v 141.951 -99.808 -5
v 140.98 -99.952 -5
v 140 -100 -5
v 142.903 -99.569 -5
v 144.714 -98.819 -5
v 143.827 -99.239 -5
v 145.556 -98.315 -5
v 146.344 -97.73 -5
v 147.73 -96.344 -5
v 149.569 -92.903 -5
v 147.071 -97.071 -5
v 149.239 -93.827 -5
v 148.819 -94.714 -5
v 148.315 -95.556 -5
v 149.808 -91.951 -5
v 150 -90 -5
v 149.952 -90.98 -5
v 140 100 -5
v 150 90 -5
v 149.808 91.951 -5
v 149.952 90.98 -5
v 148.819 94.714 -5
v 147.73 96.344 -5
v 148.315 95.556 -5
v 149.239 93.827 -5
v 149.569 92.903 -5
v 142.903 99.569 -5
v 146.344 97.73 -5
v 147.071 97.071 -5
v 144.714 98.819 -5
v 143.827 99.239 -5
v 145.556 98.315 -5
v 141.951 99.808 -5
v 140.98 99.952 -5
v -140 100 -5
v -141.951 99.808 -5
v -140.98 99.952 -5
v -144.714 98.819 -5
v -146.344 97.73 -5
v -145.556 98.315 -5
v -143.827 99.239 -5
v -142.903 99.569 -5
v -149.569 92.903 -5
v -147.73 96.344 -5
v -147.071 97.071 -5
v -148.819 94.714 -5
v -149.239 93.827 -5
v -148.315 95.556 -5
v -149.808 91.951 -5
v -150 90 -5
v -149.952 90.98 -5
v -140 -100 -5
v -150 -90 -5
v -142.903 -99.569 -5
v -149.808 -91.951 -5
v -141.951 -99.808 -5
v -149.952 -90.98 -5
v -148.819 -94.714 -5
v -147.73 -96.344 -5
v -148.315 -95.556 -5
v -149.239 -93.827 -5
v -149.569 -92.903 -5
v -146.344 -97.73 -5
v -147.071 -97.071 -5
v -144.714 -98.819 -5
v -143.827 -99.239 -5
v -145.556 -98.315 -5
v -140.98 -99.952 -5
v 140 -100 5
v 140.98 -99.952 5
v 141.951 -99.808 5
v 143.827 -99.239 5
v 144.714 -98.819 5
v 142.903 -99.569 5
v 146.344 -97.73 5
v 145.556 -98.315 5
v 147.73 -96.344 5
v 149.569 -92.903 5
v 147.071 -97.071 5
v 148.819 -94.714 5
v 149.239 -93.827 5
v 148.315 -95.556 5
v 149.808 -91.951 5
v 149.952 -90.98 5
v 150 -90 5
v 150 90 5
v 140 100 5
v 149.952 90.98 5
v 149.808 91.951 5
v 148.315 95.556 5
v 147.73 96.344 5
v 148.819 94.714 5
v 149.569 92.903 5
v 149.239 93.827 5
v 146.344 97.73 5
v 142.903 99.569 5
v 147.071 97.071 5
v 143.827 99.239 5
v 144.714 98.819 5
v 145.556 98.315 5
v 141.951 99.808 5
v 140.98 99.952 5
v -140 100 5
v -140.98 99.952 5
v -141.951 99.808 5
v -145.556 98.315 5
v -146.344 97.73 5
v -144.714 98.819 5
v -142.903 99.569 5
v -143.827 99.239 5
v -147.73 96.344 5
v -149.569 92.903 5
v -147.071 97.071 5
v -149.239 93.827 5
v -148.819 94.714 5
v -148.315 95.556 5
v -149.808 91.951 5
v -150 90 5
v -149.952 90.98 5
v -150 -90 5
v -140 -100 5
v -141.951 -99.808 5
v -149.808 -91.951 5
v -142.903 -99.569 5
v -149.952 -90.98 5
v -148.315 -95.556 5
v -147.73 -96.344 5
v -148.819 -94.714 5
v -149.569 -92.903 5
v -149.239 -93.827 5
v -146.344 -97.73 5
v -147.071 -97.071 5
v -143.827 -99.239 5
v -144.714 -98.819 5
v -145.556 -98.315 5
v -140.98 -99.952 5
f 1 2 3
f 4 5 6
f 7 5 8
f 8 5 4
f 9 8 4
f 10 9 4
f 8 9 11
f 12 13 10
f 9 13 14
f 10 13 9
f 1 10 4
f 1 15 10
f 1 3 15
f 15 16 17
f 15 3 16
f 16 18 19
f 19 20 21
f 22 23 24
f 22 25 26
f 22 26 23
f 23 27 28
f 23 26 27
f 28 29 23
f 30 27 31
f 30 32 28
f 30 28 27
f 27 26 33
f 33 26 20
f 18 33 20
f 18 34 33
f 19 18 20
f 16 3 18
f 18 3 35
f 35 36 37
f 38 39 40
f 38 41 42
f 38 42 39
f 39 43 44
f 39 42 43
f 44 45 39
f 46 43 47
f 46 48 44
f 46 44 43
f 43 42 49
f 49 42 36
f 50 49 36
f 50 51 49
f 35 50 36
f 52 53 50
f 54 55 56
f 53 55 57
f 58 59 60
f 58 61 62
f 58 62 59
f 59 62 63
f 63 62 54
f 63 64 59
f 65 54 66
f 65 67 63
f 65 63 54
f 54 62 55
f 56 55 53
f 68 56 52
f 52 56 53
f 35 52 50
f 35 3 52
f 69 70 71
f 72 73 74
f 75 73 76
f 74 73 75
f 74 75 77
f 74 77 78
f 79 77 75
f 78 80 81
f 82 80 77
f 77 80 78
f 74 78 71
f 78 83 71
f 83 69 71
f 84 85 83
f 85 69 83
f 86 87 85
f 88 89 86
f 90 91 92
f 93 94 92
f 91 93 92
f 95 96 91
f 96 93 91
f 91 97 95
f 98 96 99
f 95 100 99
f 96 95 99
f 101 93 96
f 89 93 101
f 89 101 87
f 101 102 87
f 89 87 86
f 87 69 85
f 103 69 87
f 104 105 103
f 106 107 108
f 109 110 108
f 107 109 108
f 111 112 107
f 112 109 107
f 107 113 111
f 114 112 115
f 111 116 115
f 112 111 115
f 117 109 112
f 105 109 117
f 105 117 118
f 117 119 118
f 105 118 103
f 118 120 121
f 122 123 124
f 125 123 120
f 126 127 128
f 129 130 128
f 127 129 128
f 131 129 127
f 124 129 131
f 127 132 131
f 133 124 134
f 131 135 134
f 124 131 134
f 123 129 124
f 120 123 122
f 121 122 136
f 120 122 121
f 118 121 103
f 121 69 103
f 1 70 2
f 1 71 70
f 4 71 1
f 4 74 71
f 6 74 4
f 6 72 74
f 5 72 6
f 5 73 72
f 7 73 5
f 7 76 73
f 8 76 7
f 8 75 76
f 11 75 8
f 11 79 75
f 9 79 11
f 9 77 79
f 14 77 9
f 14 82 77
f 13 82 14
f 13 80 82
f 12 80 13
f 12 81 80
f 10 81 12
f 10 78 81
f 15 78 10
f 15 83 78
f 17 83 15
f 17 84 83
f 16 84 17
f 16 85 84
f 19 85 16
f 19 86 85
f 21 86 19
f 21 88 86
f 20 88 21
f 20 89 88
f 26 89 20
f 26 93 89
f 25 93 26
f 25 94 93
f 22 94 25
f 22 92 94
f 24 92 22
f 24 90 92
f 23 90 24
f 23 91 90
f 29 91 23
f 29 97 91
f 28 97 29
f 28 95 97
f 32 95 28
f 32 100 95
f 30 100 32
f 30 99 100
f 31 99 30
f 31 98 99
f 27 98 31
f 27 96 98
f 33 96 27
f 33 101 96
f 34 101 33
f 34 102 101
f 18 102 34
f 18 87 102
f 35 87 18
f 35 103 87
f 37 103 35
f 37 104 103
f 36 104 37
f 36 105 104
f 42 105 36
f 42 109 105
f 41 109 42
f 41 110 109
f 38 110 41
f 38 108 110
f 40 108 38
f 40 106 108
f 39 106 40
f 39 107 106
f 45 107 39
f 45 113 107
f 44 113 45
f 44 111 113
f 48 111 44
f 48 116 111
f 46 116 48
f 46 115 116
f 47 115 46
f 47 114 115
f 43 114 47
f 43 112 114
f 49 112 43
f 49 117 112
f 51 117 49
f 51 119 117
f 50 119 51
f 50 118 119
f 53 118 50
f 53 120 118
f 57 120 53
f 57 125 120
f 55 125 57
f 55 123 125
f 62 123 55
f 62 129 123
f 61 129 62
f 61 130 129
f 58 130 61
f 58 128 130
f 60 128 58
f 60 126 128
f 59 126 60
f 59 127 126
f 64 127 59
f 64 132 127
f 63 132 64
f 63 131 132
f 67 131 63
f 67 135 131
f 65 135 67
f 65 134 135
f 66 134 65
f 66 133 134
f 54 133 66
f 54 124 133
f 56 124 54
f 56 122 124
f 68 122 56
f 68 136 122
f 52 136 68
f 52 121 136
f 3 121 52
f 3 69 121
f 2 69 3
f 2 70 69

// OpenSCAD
$fn=64;

module tooling_plate(length=300, width=200, thickness=10, corner_r=10) {
    corner_r2 = min(corner_r, min(length, width)/2);
    translate([-length/2, -width/2, -thickness/2])
    linear_extrude(height=thickness)
    offset(r=corner_r2)
    offset(delta=-corner_r2)
    square([length, width], center=false);
}

tooling_plate(length=300, width=200, thickness=10, corner_r=10);
